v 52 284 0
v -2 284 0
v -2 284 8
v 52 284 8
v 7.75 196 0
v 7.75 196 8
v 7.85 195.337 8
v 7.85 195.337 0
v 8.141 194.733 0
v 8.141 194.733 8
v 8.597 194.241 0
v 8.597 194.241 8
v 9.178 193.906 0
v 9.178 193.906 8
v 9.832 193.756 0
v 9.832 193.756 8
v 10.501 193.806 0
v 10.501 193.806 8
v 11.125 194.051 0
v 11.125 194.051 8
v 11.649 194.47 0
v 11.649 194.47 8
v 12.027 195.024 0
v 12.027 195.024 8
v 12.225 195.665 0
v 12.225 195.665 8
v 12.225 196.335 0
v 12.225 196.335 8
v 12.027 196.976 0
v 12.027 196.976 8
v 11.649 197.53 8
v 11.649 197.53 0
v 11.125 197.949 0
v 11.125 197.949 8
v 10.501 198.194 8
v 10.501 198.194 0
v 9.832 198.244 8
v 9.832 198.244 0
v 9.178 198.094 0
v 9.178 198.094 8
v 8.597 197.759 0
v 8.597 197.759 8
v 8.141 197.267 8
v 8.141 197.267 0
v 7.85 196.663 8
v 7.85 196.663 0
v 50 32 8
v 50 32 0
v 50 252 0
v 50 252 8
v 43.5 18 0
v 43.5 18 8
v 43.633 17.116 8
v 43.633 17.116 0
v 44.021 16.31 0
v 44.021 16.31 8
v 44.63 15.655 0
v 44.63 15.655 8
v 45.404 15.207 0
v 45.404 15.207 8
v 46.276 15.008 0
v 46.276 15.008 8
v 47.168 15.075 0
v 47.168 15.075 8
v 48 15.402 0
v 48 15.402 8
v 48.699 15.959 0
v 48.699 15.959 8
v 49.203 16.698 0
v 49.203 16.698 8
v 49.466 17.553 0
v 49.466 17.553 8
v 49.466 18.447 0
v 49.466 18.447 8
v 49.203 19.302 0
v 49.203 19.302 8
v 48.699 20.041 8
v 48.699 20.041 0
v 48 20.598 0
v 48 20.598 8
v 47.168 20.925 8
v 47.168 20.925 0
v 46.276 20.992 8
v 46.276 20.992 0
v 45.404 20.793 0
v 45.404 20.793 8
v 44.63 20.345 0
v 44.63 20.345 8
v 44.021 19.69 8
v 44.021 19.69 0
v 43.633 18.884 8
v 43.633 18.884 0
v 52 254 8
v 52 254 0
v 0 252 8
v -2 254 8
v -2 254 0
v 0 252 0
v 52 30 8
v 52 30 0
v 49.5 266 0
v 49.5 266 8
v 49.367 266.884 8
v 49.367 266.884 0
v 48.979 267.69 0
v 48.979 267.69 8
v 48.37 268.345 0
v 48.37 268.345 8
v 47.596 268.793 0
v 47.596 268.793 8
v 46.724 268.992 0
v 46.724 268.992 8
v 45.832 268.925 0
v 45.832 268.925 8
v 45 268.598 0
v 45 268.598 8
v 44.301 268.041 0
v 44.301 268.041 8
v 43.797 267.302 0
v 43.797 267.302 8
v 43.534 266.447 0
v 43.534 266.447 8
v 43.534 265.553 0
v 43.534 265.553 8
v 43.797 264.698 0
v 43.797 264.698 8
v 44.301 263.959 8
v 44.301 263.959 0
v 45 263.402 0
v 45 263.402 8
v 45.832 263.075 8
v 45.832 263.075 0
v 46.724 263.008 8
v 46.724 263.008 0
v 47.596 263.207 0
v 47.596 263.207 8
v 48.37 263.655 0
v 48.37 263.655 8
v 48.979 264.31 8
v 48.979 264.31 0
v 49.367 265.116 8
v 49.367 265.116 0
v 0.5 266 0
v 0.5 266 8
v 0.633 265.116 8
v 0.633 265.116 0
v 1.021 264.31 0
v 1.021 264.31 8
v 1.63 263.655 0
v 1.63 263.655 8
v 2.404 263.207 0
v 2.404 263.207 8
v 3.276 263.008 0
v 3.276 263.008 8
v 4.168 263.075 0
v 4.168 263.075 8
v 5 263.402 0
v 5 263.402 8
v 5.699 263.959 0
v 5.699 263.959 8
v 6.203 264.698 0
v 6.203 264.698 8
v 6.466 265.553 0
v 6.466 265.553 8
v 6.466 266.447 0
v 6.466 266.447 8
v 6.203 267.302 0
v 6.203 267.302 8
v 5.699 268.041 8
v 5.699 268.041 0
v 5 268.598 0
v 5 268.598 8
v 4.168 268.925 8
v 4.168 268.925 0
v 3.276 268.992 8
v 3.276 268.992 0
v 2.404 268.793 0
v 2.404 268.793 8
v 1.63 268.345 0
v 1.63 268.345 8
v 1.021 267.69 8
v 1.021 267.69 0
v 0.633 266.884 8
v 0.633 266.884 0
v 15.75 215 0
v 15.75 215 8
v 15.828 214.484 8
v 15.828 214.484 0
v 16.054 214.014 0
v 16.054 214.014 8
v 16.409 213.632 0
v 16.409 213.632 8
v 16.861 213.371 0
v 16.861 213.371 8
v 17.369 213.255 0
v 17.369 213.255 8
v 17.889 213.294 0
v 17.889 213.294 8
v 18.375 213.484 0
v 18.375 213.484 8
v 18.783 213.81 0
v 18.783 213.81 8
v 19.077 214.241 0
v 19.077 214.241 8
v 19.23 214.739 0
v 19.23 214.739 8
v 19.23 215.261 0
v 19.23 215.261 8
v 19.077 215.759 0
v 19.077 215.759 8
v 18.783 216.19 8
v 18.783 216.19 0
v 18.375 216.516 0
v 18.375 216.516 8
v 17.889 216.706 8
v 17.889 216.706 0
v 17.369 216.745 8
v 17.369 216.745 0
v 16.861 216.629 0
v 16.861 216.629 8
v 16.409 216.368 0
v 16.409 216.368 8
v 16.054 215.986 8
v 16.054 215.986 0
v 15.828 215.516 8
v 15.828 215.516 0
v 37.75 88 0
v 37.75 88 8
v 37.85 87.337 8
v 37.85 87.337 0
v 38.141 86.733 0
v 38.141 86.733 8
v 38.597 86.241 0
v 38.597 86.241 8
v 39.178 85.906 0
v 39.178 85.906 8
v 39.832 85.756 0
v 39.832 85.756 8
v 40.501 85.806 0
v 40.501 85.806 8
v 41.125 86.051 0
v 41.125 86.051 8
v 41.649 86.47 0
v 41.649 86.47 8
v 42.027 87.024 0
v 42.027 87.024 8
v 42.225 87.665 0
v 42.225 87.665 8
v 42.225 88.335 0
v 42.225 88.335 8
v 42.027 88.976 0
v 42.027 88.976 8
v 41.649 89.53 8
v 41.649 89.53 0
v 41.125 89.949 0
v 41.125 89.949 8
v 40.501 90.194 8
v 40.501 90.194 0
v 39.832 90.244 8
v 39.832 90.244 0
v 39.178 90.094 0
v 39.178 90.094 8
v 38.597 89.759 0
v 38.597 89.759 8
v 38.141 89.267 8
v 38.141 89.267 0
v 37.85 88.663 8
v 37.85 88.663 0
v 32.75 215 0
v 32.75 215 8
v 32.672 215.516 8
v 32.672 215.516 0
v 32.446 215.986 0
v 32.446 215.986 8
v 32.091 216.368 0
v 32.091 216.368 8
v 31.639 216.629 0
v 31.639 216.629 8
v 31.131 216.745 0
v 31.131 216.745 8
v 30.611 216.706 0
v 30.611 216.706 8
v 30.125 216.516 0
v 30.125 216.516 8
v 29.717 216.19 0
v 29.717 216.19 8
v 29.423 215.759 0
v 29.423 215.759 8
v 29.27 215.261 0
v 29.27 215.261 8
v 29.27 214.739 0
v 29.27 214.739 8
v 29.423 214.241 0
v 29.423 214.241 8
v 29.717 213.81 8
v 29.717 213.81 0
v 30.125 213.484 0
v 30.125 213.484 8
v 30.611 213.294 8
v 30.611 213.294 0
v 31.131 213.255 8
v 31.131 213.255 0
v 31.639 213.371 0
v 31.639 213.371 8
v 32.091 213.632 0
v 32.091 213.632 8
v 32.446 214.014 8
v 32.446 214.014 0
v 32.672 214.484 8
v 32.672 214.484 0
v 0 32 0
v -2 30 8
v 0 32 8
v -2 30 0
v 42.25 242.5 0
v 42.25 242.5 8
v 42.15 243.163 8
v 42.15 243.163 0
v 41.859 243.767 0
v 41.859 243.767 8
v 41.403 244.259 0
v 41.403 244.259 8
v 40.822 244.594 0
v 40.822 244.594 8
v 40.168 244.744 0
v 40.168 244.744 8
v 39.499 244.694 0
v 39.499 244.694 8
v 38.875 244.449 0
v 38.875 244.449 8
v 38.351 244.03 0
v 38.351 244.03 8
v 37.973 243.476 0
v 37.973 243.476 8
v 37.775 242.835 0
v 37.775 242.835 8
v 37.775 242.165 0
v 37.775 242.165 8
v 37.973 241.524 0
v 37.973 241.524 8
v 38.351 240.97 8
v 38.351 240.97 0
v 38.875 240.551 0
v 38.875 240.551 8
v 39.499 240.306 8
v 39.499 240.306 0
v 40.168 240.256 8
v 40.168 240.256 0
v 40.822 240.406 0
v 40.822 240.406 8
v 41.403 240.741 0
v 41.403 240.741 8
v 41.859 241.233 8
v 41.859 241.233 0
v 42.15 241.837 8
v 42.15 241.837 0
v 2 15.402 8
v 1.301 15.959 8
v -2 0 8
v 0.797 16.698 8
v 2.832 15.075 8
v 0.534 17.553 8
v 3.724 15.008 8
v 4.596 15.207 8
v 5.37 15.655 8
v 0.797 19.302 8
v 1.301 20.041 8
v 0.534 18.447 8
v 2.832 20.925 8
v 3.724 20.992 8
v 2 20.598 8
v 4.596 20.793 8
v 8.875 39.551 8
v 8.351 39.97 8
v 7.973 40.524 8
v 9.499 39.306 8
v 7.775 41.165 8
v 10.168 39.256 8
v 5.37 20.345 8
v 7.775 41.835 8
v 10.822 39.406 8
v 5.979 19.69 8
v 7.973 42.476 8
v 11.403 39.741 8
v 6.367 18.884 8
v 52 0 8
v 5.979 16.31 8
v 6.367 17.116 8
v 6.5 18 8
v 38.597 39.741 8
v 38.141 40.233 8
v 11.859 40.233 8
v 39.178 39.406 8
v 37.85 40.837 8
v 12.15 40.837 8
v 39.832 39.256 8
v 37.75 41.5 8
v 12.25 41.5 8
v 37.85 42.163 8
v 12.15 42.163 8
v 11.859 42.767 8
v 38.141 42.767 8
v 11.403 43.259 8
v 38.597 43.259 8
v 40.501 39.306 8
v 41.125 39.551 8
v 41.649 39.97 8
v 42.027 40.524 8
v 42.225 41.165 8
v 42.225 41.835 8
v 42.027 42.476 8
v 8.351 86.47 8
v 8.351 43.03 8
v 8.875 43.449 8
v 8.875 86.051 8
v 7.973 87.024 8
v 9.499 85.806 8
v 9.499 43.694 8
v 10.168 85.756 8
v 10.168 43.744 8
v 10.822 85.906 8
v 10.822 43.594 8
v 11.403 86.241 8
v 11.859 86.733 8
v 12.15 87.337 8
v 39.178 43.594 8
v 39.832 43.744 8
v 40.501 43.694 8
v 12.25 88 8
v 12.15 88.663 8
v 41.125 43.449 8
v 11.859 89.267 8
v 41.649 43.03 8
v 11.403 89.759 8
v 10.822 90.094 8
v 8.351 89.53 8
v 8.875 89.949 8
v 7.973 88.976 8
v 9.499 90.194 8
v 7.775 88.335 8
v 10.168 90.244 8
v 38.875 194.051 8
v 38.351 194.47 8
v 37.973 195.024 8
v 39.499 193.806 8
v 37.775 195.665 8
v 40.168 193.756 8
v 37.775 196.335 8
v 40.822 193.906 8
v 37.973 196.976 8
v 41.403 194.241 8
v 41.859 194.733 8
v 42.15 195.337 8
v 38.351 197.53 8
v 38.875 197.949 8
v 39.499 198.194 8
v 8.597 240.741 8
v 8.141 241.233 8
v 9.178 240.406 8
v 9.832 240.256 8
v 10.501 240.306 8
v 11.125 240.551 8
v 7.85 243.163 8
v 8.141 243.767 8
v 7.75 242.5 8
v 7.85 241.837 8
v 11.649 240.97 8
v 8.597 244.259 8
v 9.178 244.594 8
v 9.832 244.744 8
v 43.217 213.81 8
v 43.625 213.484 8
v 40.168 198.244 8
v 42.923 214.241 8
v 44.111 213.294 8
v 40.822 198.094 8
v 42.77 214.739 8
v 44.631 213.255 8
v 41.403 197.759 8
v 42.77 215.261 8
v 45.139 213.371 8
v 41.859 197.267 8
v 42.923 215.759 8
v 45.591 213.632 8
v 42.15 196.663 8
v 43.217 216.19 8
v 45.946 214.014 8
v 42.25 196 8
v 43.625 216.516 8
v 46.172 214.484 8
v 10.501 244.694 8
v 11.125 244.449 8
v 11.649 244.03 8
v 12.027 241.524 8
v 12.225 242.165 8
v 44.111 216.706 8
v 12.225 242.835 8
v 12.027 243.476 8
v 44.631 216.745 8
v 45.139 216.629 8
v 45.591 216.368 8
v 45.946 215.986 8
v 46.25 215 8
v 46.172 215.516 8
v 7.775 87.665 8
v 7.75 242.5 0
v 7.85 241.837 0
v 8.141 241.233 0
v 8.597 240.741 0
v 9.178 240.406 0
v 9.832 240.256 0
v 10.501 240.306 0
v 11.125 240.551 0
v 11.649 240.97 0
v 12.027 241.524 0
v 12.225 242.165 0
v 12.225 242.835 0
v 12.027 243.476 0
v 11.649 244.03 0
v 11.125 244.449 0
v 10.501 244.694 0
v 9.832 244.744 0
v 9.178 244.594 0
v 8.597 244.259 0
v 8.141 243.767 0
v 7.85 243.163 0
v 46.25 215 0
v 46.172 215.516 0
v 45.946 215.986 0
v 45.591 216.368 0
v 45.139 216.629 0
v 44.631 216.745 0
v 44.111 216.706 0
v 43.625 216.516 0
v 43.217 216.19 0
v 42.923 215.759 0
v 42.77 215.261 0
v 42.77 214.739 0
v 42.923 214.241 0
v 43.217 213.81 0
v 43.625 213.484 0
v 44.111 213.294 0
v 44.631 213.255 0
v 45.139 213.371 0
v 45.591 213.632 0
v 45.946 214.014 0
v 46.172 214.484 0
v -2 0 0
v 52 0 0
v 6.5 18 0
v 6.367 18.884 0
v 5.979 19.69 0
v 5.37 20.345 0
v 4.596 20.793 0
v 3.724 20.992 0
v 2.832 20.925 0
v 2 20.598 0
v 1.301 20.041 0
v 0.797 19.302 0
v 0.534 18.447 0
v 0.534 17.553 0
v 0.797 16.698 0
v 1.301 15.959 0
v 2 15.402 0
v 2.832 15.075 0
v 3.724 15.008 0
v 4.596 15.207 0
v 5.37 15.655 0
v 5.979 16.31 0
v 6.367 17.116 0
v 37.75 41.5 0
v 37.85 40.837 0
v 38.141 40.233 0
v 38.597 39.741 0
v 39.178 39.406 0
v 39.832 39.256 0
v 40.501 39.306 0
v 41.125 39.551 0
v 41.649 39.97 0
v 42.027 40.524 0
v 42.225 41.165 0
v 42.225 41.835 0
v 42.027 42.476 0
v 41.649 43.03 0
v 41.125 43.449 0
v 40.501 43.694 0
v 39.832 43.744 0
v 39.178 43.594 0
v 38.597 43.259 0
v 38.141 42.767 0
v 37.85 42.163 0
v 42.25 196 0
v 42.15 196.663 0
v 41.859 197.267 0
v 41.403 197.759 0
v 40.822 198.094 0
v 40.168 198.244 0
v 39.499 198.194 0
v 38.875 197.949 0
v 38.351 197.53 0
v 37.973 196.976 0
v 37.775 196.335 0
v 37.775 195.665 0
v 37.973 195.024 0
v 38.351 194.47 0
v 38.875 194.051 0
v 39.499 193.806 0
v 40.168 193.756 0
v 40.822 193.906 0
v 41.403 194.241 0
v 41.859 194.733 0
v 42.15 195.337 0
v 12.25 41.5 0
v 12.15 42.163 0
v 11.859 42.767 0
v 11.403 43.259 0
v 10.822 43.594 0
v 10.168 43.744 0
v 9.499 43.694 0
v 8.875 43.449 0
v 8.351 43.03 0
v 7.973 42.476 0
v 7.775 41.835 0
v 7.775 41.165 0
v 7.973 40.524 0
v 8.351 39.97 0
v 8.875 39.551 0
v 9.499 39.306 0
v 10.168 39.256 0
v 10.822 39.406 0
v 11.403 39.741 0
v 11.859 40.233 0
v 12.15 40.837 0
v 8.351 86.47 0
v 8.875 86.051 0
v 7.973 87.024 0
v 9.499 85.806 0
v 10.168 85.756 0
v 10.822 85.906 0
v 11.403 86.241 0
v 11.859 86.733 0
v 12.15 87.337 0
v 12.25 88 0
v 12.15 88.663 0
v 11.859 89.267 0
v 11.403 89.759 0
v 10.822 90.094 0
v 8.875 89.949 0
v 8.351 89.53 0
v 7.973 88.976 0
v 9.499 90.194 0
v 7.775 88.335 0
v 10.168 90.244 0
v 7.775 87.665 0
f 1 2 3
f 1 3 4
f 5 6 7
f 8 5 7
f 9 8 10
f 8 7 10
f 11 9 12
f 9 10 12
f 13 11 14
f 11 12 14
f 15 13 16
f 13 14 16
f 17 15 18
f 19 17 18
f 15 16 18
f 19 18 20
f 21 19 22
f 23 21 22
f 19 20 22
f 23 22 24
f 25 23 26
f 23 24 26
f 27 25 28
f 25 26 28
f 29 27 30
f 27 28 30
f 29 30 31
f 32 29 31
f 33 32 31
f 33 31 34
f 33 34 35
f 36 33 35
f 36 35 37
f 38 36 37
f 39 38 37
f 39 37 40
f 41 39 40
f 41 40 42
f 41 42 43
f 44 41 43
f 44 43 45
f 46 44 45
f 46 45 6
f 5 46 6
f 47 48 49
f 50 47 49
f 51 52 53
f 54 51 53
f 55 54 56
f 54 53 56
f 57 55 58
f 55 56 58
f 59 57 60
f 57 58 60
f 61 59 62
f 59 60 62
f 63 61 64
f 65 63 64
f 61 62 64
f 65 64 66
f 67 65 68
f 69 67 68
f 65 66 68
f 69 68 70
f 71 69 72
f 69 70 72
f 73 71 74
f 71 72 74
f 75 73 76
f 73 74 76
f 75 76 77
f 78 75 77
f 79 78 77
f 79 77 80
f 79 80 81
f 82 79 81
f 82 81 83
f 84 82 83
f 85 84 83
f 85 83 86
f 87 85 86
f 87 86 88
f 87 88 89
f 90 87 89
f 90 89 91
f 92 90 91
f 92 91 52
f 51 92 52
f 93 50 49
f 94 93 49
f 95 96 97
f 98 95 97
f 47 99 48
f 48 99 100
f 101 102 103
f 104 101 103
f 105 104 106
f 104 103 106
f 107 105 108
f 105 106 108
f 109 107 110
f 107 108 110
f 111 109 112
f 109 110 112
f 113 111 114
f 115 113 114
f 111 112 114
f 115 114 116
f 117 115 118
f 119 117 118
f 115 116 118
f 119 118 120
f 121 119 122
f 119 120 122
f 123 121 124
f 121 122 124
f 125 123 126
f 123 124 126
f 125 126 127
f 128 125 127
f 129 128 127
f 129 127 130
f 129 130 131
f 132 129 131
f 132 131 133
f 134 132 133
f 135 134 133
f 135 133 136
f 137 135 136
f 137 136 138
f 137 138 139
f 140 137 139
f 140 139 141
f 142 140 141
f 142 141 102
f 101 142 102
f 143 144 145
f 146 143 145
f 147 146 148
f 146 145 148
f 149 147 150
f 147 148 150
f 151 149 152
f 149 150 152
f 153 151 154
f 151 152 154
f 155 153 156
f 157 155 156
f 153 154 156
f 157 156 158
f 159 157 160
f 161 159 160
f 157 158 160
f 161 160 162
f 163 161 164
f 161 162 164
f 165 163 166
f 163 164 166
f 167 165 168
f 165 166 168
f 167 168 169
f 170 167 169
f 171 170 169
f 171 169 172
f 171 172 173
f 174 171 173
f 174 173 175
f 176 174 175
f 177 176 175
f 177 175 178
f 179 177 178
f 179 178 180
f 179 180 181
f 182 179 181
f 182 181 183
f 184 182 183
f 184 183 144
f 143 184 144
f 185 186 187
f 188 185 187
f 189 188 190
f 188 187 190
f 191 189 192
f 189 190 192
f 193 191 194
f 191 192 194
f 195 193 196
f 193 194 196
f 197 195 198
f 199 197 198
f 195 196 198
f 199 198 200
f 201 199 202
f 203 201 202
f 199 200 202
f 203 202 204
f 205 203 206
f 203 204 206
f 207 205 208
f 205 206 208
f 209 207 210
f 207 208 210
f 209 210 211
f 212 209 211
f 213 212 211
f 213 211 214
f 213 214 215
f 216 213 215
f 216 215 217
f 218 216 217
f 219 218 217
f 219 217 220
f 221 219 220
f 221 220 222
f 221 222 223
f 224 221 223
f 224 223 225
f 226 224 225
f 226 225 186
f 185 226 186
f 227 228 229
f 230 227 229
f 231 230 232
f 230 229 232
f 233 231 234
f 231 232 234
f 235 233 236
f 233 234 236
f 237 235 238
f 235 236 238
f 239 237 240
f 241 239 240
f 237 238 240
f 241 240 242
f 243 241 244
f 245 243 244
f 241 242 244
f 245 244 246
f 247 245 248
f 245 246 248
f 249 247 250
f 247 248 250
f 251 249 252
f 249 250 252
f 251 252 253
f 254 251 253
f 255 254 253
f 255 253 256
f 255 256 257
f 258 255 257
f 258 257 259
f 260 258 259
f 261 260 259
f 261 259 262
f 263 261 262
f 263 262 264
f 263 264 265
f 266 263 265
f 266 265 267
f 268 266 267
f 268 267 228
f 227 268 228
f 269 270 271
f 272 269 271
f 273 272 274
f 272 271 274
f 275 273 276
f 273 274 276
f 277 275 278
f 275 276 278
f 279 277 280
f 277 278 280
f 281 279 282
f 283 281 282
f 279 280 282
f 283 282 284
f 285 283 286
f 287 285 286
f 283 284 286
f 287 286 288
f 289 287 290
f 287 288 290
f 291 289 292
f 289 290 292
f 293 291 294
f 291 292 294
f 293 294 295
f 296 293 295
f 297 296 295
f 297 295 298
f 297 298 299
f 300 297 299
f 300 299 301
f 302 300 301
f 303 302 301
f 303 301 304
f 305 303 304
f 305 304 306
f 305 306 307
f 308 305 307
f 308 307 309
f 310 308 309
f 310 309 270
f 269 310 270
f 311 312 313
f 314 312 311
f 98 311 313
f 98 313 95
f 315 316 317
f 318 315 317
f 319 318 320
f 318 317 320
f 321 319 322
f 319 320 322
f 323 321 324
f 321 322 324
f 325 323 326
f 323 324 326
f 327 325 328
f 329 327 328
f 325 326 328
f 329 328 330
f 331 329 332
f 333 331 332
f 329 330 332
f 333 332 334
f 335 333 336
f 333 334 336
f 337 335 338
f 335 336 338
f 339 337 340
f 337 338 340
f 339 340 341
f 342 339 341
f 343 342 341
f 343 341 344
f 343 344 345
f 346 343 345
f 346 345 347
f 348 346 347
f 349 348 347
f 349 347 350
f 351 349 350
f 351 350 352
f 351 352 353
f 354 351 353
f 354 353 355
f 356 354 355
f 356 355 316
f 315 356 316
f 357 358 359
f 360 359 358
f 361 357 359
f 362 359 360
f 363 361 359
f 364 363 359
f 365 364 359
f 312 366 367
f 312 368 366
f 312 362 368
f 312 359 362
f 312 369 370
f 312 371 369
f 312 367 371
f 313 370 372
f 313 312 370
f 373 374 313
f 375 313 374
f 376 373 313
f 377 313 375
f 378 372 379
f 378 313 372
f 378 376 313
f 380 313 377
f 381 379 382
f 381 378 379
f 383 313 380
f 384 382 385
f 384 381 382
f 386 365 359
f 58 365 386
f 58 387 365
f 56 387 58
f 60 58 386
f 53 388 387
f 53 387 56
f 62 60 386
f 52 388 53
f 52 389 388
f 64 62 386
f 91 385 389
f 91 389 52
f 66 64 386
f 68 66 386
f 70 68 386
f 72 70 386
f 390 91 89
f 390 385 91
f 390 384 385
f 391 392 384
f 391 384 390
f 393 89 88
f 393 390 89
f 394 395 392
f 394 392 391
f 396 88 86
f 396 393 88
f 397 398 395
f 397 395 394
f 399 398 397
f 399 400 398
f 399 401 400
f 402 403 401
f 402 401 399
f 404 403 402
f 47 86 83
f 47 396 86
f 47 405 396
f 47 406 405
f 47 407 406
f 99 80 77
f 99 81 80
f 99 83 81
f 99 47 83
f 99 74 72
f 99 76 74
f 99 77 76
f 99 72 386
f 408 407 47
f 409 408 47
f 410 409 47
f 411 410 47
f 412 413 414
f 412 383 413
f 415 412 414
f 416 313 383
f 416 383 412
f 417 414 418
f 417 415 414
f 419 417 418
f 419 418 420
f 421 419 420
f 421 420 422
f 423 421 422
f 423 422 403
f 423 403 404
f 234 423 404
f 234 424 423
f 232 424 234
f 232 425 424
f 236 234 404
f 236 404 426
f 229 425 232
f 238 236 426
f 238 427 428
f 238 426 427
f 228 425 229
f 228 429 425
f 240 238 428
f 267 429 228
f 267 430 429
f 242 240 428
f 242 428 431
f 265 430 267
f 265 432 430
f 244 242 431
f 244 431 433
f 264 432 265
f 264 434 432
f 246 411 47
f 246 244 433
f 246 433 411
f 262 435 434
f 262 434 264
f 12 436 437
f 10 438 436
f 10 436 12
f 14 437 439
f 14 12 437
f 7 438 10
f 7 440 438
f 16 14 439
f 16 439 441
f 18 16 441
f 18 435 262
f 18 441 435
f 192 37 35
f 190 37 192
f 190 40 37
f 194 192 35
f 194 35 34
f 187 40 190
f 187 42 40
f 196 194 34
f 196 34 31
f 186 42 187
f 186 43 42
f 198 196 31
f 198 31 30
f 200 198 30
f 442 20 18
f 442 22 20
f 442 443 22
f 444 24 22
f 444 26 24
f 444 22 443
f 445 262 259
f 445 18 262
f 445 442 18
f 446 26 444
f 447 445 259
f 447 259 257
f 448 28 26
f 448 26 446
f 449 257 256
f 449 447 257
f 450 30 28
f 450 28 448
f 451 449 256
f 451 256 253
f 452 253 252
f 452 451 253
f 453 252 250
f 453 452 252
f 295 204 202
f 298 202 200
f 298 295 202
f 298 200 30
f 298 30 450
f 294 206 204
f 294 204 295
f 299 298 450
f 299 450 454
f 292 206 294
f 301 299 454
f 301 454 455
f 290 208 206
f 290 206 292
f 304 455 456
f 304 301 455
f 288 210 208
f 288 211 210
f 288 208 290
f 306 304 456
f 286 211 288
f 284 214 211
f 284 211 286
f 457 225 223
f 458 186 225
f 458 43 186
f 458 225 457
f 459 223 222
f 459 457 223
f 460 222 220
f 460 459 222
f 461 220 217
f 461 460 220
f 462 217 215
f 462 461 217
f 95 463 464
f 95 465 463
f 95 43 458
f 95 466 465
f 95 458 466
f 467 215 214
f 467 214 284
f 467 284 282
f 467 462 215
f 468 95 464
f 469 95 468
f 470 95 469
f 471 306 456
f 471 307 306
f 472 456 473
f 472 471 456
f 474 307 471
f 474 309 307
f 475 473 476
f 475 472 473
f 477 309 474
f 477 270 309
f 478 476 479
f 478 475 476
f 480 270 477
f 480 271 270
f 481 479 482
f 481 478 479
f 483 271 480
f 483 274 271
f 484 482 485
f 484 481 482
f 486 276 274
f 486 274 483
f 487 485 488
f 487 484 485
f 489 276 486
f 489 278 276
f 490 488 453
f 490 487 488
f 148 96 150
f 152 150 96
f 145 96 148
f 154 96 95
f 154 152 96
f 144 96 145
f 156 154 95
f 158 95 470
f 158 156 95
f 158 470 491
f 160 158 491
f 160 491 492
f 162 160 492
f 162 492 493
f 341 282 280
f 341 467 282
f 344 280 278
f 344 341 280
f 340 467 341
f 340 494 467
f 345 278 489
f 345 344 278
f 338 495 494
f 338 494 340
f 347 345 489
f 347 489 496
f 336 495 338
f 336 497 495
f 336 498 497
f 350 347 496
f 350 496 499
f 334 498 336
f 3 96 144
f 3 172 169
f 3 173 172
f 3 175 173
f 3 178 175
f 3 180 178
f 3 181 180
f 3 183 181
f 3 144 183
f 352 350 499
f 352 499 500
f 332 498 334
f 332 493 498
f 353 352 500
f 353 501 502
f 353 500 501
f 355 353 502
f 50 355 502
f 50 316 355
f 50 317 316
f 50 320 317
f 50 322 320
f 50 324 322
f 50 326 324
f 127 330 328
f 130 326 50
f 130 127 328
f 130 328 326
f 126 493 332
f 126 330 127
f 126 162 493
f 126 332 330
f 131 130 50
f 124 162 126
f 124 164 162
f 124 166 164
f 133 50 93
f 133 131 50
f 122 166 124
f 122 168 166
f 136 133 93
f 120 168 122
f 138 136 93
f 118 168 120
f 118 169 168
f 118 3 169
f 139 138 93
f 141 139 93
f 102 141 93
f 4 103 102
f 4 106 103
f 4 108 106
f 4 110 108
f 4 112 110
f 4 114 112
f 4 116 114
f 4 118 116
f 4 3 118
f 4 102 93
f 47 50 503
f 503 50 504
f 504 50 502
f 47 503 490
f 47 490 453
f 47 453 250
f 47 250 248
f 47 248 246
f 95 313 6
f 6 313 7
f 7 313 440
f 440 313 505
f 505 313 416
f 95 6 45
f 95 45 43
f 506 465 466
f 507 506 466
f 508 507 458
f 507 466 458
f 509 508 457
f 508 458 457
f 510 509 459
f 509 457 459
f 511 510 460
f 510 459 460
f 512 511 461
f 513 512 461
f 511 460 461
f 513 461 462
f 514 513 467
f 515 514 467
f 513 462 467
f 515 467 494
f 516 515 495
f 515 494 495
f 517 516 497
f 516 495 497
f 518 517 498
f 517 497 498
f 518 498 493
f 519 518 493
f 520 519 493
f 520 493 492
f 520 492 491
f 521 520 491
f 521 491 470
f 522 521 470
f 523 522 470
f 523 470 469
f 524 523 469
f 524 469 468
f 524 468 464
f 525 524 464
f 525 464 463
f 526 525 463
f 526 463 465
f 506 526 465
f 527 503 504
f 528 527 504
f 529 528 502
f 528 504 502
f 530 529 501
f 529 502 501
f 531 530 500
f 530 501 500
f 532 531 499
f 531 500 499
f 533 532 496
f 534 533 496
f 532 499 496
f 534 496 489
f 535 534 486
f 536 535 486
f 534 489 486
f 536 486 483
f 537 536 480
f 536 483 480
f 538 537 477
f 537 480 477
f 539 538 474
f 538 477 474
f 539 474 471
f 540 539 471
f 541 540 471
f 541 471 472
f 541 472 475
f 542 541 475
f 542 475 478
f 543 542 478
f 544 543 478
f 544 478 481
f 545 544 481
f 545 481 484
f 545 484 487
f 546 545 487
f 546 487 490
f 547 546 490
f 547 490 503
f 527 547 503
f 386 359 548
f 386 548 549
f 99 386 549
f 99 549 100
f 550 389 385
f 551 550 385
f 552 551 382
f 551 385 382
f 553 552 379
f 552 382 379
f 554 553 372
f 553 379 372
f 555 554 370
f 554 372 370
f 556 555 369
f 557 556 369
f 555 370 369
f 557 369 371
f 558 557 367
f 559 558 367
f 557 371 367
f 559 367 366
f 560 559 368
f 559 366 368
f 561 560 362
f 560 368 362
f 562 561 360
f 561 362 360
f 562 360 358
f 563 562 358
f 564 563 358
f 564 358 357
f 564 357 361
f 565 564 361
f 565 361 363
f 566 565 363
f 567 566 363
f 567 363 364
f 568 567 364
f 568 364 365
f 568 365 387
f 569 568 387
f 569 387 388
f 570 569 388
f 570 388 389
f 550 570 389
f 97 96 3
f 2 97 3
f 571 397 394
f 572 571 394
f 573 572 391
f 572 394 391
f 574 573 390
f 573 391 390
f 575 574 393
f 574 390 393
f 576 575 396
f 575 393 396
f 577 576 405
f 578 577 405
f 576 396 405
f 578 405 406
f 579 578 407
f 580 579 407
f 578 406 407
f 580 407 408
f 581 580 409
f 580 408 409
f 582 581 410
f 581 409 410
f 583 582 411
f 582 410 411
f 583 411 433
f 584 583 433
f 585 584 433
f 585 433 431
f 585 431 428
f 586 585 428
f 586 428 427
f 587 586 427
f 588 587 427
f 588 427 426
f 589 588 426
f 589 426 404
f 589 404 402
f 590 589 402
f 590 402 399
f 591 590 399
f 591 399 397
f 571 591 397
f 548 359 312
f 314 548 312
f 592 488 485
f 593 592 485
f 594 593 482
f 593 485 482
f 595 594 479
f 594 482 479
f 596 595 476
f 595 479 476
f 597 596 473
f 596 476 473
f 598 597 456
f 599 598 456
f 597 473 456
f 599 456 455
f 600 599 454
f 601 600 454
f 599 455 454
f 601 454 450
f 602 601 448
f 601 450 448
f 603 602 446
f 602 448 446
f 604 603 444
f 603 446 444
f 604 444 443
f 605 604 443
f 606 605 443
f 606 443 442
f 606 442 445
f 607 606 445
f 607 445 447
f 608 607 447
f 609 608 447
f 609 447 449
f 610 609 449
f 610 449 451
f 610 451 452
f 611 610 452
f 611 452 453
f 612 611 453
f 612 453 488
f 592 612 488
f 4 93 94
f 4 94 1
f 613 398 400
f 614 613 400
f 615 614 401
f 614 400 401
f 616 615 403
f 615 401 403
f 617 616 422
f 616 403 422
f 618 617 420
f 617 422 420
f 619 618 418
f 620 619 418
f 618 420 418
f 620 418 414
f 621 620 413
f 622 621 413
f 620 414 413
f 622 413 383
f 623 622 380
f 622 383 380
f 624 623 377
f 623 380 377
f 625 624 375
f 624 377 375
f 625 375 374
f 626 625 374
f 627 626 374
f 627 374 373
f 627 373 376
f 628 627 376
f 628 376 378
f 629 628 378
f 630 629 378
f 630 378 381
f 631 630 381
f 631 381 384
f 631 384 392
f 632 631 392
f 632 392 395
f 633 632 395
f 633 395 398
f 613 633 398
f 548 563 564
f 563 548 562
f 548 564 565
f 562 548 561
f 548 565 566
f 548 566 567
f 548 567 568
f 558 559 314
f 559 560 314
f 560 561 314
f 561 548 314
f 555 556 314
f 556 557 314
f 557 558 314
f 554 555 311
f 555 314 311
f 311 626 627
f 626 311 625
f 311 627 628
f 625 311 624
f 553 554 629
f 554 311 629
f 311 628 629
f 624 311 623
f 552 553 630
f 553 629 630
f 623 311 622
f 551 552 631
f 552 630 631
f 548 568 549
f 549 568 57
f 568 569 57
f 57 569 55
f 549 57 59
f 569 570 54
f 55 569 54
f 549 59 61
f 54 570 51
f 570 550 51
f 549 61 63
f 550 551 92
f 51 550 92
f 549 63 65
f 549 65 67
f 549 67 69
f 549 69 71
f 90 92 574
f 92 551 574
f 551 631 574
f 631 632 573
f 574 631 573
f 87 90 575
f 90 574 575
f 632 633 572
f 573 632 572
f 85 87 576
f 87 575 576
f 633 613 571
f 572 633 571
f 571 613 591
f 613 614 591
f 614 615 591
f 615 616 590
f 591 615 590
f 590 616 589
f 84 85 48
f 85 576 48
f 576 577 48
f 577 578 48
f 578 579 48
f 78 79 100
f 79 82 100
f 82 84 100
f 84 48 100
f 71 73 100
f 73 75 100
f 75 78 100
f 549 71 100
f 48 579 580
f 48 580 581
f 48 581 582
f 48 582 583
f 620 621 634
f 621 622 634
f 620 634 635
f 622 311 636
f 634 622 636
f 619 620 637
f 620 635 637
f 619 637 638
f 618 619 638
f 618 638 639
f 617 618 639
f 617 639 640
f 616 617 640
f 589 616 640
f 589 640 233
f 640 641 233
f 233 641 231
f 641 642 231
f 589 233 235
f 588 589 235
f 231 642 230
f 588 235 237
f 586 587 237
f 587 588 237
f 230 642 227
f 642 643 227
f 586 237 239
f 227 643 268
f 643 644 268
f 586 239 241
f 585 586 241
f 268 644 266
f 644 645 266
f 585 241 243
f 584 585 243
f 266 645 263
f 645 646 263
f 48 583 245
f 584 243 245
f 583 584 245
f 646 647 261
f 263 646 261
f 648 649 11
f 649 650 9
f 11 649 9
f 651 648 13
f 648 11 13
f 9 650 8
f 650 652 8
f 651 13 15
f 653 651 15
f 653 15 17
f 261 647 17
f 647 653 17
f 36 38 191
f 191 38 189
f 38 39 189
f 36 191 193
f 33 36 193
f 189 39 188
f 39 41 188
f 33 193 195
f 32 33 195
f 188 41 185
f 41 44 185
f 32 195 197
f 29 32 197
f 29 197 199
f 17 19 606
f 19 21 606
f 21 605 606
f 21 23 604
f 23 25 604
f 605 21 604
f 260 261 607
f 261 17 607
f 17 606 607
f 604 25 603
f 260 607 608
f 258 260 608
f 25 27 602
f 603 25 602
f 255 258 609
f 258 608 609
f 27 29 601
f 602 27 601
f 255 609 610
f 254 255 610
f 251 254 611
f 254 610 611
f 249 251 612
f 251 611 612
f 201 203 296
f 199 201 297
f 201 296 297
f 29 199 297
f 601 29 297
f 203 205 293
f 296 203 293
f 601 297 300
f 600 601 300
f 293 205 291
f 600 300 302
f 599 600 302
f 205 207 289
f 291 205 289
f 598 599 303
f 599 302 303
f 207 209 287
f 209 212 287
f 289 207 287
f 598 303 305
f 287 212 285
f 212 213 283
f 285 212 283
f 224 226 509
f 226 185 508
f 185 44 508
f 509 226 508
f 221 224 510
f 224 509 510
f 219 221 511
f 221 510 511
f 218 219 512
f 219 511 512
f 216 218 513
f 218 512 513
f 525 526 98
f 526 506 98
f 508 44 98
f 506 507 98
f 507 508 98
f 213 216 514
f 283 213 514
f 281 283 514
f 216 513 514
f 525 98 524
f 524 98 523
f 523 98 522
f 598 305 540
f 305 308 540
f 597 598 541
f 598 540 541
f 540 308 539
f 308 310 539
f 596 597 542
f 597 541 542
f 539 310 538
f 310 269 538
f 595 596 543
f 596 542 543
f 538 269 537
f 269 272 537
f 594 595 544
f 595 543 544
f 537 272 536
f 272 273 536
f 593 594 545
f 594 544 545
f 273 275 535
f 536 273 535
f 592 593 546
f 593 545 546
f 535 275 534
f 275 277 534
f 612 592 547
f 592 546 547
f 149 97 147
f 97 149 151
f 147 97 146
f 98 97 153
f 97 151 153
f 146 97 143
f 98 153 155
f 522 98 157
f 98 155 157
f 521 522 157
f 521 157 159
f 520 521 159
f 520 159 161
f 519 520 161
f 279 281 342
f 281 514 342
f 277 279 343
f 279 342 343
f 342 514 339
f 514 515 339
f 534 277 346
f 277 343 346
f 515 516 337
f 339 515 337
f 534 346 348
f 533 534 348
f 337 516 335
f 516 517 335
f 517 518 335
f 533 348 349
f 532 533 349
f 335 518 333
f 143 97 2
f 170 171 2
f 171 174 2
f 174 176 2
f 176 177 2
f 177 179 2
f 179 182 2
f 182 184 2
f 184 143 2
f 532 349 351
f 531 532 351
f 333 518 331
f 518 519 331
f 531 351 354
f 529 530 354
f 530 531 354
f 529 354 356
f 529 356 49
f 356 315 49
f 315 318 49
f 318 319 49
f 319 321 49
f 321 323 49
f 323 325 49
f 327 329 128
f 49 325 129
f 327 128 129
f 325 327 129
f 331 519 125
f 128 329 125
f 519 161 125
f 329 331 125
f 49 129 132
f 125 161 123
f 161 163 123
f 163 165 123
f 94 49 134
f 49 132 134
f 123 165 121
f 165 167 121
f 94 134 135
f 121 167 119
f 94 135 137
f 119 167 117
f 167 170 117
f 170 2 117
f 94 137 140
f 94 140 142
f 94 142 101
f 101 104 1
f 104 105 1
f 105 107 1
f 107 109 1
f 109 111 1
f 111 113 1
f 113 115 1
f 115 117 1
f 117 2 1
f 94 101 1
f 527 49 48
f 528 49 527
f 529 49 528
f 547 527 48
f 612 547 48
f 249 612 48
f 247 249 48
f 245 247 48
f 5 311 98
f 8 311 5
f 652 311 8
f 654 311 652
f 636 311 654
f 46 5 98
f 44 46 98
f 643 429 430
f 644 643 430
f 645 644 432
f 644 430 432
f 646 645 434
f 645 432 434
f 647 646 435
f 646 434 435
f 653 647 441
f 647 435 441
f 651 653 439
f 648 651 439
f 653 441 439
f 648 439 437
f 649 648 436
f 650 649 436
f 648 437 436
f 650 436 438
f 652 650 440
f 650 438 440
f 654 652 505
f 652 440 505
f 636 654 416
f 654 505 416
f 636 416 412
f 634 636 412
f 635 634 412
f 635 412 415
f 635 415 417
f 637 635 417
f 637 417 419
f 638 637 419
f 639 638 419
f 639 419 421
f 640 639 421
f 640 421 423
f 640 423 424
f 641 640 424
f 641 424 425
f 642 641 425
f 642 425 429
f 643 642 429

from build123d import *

# Parameters (mm, degrees)
ESQUISSE1_W             = 50
ESQUISSE1_H             = 284
BOSS_EXTRU_1_DEPTH      = 8
ESQUISSE2_R             = 3
ENL_V_MAT_EXTRU_1_DEPTH = 289.478768716
ESQUISSE3_W             = 2
ESQUISSE3_H             = 30
BOSS_EXTRU_2_DEPTH      = 8
CHANFREIN1_SIZE         = 2
ESQUISSE4_R             = 2.25
ENL_V_MAT_EXTRU_2_DEPTH = 289.832131177
ESQUISSE5_R             = 1.75
ENL_V_MAT_EXTRU_3_DEPTH = 289.832131177


with BuildPart() as part:
    # Esquisse1 → Boss.-Extru.1 (new body)
    with BuildSketch(Plane.XY):
        with Locations((25, 142)):
            Rectangle(ESQUISSE1_W, ESQUISSE1_H)
    extrude(amount=BOSS_EXTRU_1_DEPTH)

    # Esquisse2 → Enlèv. mat.-Extru.1 (cut, through all)
    with BuildSketch(Plane.XY.offset(8)):
        with Locations((3.5, 18)):
            Circle(ESQUISSE2_R)
        with Locations(Location((46.5, 18, 0), (0, 0, 180))):
            Circle(ESQUISSE2_R)
        with Locations((46.5, 266)):
            Circle(ESQUISSE2_R)
        with Locations(Location((3.5, 266, 0), (0, 0, 180))):
            Circle(ESQUISSE2_R)
    extrude(amount=-ENL_V_MAT_EXTRU_1_DEPTH, mode=Mode.SUBTRACT)

    # Esquisse3 → Boss.-Extru.2 (add)
    with BuildSketch(Plane.XY.offset(8)):
        with Locations((-1, 15)):
            Rectangle(ESQUISSE3_W, ESQUISSE3_H)
        with Locations((51, 15)):
            Rectangle(ESQUISSE3_W, ESQUISSE3_H)
        with Locations((51, 269)):
            Rectangle(ESQUISSE3_W, ESQUISSE3_H)
        with Locations((-1, 269)):
            Rectangle(ESQUISSE3_W, ESQUISSE3_H)
    extrude(amount=-BOSS_EXTRU_2_DEPTH)

    # Chanfrein1
    chanfrein1_edges = [part.edges().sort_by_distance(p)[0] for p in [
        (50, 30, 4),
        (0, 30, 4),
        (0, 254, 4),
        (50, 254, 4),
    ]]
    chamfer(chanfrein1_edges, length=CHANFREIN1_SIZE - 0.0001)  # a hair under: the kernel refuses the full size

    # Esquisse4 → Enlèv. mat.-Extru.2 (cut, through all)
    with BuildSketch(Plane.XY.offset(8)):
        with Locations((10, 41.5)):
            Circle(ESQUISSE4_R)
        with Locations((10, 88)):
            Circle(ESQUISSE4_R)
        with Locations(Location((40, 88, 0), (0, 0, 180))):
            Circle(ESQUISSE4_R)
        with Locations(Location((40, 41.5, 0), (0, 0, 180))):
            Circle(ESQUISSE4_R)
        with Locations((40, 242.5)):
            Circle(ESQUISSE4_R)
        with Locations((40, 196)):
            Circle(ESQUISSE4_R)
        with Locations(Location((10, 196, 0), (0, 0, 180))):
            Circle(ESQUISSE4_R)
        with Locations(Location((10, 242.5, 0), (0, 0, 180))):
            Circle(ESQUISSE4_R)
    extrude(amount=-ENL_V_MAT_EXTRU_2_DEPTH, mode=Mode.SUBTRACT)

    # Esquisse5 → Enlèv. mat.-Extru.3 (cut, through all)
    with BuildSketch(Plane.XY.offset(8)):
        with Locations((44.5, 215)):
            Circle(ESQUISSE5_R)
        with Locations((31, 215)):
            Circle(ESQUISSE5_R)
        with Locations(Location((17.5, 215, 0), (0, 0, 180))):
            Circle(ESQUISSE5_R)
    extrude(amount=-ENL_V_MAT_EXTRU_3_DEPTH, mode=Mode.SUBTRACT)


solid = part.part
